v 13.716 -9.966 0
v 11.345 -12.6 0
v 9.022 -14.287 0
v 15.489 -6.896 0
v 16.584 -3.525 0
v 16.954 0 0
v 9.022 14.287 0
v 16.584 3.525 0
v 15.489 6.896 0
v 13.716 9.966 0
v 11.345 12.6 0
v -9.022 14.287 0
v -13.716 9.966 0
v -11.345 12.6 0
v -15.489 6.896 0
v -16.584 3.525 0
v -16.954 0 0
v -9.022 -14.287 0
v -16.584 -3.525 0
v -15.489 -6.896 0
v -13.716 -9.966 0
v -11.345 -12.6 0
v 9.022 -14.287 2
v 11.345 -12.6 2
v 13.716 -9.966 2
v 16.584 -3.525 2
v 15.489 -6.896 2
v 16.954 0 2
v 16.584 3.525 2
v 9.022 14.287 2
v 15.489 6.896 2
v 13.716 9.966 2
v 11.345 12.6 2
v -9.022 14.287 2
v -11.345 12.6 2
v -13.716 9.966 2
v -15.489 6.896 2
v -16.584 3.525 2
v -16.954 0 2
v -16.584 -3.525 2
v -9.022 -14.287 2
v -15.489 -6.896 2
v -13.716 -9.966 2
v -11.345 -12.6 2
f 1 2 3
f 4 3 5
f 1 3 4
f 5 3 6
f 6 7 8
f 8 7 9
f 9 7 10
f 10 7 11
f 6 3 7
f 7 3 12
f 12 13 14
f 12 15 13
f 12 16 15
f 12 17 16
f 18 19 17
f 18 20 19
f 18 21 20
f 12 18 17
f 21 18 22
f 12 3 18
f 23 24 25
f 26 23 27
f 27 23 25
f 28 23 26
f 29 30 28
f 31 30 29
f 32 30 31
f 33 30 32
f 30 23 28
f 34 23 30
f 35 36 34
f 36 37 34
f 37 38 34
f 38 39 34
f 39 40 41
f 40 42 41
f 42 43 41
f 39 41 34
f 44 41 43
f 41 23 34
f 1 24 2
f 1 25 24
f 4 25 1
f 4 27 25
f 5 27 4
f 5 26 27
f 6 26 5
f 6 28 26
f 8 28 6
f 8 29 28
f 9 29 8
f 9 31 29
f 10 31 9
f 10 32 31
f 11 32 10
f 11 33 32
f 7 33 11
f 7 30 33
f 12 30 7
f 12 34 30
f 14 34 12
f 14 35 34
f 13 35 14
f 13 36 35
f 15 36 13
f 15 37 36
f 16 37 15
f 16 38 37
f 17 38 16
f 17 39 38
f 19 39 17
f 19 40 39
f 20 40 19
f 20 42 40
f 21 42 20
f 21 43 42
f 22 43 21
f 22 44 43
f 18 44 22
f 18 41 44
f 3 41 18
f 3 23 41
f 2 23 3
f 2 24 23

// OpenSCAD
inch=25.4;
sqwidth=(1+3/8)*inch;
sqheight=(1+1/8)*inch;

module 2dplug() {
    intersection() {
        circle(r=.6675*inch);
        translate([-sqwidth/2, -sqheight/2]) square([sqwidth, sqheight]);
    }
}

linear_extrude(2) 2dplug();
